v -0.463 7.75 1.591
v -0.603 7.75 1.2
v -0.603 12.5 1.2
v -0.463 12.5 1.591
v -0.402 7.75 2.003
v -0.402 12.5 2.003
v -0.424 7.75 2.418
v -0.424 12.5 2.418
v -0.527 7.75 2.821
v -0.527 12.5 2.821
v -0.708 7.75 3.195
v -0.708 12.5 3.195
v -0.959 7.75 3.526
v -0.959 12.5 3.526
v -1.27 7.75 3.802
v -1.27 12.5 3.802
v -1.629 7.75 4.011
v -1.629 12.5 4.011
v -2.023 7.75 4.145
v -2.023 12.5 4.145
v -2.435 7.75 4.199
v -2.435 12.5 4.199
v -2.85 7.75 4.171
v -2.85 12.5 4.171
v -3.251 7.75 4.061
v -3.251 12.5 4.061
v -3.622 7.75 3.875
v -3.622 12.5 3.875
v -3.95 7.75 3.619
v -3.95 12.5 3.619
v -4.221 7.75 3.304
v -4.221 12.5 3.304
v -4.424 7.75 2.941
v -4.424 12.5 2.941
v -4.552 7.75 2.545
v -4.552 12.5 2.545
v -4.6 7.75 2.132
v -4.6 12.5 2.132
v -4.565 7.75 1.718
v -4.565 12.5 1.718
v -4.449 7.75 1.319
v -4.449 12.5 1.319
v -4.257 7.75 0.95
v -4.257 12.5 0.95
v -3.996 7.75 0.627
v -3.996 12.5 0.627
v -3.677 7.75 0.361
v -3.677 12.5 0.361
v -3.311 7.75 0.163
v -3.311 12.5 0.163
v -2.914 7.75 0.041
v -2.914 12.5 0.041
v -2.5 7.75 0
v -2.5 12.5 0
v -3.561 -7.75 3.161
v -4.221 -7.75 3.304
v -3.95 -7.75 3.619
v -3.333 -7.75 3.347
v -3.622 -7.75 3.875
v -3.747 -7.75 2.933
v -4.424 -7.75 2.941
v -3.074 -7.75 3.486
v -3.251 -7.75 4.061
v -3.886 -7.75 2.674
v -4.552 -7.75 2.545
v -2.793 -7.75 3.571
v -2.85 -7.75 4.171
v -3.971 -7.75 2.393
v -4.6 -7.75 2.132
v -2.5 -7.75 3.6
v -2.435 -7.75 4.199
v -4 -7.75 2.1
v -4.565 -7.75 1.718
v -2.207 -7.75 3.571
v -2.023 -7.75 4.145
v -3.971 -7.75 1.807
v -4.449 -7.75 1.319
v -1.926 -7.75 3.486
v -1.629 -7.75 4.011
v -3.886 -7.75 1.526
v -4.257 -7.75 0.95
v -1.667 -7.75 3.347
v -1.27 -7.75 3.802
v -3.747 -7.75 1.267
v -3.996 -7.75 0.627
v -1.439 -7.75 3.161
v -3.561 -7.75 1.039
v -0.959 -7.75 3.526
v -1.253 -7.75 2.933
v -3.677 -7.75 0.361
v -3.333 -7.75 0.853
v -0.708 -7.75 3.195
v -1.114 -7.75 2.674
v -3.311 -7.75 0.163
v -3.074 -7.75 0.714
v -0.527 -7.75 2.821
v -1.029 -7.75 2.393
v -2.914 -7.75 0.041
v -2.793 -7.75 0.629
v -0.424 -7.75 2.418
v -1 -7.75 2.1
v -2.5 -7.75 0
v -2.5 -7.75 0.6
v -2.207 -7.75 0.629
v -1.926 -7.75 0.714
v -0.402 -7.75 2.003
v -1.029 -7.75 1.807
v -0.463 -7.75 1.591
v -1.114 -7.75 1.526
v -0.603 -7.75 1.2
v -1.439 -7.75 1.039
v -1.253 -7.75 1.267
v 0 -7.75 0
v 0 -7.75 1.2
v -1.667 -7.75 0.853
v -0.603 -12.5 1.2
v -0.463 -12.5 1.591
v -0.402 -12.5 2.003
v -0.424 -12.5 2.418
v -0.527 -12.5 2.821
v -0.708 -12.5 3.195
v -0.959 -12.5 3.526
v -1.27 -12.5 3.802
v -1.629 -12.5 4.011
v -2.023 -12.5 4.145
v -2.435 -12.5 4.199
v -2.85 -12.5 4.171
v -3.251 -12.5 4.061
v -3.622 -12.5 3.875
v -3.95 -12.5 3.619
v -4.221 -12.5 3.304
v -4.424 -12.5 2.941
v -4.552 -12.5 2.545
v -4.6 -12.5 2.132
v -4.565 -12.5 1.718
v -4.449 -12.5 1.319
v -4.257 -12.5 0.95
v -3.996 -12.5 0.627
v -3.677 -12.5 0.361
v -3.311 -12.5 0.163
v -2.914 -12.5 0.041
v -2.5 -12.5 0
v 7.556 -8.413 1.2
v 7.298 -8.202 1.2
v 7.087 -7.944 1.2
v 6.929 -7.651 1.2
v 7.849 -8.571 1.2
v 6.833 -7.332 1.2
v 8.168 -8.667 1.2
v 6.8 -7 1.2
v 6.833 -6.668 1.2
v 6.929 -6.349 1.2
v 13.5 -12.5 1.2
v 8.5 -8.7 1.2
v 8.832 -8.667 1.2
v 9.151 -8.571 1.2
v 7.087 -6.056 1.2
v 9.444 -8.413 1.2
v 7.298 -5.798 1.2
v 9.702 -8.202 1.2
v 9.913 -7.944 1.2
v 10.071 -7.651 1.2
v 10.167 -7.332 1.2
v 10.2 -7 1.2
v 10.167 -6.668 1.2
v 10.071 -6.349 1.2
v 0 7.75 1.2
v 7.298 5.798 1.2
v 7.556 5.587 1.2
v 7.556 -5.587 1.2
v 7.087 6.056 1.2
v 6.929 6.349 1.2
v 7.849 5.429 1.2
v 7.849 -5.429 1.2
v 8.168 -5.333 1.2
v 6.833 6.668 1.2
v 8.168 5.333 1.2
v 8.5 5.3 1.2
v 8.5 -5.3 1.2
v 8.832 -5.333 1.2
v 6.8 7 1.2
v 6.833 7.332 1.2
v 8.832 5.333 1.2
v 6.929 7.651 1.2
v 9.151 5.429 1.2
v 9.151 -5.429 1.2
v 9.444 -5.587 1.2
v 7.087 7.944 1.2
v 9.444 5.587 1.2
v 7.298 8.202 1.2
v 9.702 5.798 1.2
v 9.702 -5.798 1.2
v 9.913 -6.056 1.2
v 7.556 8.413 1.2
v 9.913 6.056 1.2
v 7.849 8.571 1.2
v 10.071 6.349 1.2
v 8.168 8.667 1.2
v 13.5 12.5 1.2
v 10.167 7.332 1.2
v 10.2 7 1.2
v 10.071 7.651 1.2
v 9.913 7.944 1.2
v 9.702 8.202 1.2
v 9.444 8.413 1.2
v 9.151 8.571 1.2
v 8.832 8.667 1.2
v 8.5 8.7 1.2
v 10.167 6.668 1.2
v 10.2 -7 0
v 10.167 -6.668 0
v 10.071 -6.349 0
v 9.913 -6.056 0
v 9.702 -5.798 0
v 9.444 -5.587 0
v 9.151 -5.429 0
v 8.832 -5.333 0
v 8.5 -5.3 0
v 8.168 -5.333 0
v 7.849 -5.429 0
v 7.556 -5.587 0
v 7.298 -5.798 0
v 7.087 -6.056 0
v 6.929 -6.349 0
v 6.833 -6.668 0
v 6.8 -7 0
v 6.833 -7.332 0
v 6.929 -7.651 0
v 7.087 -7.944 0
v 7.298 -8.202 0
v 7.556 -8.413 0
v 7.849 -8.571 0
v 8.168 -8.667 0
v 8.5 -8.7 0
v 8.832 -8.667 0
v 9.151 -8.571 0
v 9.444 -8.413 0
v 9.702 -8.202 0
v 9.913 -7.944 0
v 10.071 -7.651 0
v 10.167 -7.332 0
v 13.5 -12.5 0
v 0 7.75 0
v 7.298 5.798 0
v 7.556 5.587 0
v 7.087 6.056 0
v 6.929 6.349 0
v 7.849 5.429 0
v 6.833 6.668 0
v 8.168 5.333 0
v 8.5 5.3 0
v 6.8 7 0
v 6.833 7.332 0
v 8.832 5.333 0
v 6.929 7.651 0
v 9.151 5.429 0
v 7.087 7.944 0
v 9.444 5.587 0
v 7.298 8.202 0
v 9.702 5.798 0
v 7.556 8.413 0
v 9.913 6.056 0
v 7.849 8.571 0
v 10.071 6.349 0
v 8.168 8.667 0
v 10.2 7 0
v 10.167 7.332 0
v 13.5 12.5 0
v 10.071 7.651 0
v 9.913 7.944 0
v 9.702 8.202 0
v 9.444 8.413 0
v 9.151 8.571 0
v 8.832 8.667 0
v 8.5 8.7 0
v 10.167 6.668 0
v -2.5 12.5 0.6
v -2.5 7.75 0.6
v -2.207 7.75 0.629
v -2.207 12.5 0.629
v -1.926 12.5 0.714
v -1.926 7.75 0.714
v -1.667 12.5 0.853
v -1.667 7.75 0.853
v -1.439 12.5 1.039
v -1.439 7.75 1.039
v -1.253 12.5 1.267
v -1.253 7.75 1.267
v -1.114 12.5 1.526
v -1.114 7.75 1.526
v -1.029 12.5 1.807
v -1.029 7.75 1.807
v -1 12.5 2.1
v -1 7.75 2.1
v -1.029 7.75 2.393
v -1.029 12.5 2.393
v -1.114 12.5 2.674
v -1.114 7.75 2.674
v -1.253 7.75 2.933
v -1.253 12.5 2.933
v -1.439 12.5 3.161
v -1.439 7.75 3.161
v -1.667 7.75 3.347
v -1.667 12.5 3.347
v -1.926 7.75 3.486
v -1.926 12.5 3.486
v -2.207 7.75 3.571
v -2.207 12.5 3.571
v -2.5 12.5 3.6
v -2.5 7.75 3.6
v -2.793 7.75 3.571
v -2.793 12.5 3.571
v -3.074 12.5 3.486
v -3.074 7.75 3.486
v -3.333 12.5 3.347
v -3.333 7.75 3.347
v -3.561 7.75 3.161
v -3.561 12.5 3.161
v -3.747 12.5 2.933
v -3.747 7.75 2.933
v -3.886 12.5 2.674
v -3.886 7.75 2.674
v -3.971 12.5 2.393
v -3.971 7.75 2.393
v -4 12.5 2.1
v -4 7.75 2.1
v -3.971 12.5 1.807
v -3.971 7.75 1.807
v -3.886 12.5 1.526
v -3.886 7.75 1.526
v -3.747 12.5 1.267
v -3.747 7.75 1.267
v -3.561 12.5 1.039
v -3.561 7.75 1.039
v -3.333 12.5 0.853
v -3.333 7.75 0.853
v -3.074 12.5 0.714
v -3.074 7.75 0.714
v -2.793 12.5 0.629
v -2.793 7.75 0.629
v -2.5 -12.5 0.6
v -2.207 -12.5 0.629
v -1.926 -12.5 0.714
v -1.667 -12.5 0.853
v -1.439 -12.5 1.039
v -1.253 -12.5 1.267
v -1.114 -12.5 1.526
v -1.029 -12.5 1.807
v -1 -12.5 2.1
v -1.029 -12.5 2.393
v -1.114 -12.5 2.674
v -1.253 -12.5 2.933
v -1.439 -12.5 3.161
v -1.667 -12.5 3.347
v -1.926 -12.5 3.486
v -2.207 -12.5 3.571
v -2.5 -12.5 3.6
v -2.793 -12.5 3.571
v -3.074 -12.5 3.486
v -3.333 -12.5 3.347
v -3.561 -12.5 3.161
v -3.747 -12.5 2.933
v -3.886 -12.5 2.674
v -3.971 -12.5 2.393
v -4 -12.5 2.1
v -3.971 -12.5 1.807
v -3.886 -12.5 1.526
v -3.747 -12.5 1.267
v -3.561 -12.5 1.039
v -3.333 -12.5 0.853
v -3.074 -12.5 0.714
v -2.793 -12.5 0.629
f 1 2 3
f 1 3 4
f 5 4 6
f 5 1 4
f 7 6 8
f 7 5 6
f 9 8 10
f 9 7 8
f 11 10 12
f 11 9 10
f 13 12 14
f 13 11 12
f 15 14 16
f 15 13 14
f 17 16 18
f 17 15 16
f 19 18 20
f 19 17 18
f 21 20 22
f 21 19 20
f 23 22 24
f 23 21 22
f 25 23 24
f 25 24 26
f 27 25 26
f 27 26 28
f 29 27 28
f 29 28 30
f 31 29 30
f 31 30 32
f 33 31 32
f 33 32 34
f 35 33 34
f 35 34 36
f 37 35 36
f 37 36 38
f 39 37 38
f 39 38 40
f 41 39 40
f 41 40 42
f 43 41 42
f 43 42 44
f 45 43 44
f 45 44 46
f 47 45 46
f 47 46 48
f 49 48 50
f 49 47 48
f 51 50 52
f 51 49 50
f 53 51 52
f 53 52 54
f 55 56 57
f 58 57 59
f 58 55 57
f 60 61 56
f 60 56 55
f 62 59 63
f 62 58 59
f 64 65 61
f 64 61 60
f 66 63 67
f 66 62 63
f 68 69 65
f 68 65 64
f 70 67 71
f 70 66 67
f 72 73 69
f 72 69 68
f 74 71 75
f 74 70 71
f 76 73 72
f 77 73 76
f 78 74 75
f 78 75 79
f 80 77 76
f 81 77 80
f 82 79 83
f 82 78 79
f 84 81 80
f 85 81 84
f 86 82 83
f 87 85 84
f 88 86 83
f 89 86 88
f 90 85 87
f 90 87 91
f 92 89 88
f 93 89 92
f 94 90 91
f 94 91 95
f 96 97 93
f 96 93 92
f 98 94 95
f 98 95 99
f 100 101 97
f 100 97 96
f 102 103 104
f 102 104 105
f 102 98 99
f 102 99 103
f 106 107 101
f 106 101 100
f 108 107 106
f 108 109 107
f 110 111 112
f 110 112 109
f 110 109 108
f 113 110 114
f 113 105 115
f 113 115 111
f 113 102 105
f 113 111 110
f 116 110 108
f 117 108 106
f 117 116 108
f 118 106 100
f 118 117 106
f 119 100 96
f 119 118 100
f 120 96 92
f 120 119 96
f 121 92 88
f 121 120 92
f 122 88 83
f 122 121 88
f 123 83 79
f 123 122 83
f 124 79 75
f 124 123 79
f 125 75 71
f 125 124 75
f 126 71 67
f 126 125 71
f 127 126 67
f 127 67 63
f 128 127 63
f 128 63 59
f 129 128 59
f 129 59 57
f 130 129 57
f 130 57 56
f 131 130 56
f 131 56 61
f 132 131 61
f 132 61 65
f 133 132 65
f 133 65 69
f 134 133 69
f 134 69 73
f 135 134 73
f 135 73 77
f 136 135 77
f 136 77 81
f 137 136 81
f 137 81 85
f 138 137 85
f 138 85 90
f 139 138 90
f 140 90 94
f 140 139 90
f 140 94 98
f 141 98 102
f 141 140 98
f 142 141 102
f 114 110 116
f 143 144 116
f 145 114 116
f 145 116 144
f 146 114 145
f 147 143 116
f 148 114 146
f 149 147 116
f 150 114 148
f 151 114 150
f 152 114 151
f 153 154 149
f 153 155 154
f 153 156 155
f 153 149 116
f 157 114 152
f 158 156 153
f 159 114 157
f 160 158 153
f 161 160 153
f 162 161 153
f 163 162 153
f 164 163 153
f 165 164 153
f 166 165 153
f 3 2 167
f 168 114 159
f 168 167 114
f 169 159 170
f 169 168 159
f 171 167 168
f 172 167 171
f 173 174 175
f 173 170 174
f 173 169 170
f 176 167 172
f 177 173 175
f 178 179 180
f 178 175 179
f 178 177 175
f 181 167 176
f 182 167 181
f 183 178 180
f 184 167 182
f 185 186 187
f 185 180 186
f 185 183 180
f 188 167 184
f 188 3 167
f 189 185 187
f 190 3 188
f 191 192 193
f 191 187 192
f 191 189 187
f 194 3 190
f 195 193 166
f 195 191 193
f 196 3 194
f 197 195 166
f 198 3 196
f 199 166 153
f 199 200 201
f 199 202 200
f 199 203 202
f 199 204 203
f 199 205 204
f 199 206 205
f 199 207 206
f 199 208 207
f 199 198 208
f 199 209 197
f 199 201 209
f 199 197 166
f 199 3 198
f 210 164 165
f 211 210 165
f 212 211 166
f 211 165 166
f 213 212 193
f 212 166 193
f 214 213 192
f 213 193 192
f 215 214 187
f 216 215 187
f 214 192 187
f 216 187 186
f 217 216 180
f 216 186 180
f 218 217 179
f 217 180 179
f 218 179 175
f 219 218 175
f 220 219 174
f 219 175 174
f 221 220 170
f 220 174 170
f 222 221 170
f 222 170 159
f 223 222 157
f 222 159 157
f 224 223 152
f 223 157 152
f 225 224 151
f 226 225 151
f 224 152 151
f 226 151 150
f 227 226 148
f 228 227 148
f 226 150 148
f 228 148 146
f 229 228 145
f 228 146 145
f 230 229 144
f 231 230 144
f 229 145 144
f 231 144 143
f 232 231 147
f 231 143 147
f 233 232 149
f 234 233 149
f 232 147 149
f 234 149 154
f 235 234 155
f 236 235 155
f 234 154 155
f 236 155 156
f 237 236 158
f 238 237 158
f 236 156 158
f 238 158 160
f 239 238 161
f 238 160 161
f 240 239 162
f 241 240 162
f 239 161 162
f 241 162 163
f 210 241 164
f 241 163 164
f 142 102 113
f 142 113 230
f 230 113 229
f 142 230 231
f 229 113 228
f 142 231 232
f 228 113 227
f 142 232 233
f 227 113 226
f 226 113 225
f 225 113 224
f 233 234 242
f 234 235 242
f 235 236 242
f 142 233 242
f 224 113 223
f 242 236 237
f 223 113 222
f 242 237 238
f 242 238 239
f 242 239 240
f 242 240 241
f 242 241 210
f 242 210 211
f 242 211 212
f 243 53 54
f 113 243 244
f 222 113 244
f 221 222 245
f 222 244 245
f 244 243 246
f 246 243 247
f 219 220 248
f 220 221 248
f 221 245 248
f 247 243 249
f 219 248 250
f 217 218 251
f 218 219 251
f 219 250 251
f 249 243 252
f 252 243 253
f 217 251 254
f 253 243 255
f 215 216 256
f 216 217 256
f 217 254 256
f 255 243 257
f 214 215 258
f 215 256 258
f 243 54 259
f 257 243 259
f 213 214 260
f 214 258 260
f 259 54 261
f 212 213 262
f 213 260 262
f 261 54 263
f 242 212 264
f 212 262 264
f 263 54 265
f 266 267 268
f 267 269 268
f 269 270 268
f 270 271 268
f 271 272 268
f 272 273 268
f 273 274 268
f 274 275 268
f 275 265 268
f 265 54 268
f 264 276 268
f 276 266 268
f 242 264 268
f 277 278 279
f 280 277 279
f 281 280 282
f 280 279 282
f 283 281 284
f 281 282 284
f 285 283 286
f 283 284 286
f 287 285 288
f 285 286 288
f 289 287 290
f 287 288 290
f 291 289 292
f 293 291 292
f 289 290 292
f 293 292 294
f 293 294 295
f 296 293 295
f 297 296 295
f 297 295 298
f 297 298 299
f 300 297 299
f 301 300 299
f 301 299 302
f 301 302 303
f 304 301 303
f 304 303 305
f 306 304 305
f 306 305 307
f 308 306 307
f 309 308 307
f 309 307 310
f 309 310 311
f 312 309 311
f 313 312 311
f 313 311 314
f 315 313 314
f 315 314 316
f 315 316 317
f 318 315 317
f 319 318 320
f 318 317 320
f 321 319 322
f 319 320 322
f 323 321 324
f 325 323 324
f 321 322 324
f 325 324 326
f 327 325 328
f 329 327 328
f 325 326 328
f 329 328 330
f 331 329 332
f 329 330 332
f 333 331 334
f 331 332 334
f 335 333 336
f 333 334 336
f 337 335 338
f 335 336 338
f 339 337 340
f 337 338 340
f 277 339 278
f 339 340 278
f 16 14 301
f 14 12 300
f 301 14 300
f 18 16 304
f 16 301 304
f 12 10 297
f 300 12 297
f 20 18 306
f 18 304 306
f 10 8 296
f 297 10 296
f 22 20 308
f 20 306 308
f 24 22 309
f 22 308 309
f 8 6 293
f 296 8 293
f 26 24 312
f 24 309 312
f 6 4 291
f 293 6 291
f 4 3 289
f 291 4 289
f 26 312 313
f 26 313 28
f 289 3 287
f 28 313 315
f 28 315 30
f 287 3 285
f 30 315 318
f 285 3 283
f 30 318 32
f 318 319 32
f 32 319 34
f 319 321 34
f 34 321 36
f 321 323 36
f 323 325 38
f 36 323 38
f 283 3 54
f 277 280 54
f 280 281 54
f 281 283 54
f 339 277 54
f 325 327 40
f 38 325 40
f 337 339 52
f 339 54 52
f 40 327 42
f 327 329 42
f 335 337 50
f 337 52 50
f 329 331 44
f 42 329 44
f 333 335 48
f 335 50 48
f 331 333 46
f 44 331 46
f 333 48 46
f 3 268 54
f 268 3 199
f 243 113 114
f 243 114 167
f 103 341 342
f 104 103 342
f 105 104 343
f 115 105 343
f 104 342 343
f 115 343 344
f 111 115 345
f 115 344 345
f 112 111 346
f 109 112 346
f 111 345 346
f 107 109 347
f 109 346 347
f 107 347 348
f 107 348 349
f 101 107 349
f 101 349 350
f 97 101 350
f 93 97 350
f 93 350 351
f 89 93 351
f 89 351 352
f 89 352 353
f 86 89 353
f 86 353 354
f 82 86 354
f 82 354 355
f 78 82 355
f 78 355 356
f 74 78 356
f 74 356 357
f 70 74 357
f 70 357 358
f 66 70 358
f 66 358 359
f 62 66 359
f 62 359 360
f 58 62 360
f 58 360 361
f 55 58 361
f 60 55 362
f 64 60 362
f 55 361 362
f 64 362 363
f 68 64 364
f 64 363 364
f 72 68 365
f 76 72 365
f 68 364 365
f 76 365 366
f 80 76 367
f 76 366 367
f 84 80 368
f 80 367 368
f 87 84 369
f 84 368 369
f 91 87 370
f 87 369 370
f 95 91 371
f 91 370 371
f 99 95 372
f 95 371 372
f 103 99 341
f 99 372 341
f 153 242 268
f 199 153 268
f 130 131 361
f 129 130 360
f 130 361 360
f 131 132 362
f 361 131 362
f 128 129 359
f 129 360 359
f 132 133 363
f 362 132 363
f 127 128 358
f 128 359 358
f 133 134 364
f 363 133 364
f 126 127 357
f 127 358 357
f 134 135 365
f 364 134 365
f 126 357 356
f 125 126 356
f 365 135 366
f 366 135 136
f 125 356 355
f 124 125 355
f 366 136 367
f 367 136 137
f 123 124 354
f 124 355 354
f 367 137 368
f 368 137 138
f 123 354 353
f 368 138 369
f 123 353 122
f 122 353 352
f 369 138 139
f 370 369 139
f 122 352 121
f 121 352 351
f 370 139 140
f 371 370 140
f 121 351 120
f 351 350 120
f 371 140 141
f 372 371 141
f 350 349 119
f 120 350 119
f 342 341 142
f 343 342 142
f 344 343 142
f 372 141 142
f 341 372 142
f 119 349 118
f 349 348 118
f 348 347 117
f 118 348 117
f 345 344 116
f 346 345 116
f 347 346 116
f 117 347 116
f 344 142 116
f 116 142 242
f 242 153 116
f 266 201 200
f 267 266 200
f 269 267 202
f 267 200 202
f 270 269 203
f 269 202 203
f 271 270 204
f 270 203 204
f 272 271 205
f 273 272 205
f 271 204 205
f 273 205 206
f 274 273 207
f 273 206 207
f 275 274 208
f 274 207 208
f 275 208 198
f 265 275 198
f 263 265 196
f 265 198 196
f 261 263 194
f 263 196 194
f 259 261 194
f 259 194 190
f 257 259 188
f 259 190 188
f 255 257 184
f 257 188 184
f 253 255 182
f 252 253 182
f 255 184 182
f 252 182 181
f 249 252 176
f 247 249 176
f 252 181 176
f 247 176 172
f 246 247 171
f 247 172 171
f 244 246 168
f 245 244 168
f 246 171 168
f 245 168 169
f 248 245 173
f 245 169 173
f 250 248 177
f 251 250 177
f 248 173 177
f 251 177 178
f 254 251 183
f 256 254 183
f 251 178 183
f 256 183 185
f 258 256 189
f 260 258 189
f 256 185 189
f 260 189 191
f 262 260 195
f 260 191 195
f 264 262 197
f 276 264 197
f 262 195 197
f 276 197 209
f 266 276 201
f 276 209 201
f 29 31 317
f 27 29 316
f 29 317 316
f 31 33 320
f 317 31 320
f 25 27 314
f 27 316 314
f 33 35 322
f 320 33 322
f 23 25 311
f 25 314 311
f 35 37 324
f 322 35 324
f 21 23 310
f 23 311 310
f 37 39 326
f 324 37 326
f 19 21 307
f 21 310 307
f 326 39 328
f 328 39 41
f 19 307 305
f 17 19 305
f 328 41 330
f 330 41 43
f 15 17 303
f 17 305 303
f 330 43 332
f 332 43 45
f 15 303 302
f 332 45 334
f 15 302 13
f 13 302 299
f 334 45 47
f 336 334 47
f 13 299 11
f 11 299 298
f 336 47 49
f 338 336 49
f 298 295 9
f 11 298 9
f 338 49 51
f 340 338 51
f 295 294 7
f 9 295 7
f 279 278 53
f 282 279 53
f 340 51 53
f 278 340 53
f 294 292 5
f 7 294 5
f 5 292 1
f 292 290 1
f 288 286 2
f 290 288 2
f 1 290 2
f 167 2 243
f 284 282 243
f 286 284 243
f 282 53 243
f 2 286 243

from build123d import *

# Parameters (mm, degrees)
SKETCH_1_W          = 13.5
SKETCH_1_H          = 25
SKETCH_1_W_2        = 2.5
SKETCH_1_H_2        = 4.75
EXTRUDE_1_DEPTH     = 1.2
SKETCH_2_R          = 1.7
CUT_EXTRUDE_1_DEPTH = 1.2
SKETCH_3_R          = 2.1
EXTRUDE_2_DEPTH     = 25
SKETCH_4_R          = 1.5
CUT_EXTRUDE_2_DEPTH = 25
SKETCH_5_W          = 5
SKETCH_5_H          = 15.5
CUT_EXTRUDE_3_DEPTH = 7.5


with BuildPart() as part:
    # 草图1 → 凸台-拉伸1 (new body)
    with BuildSketch(Plane.XY):
        with Locations((6.75, 0)):
            Rectangle(SKETCH_1_W, SKETCH_1_H)
        with Locations((-1.25, 10.125)):
            Rectangle(SKETCH_1_W_2, SKETCH_1_H_2)
        with Locations((-1.25, -10.125)):
            Rectangle(SKETCH_1_W_2, SKETCH_1_H_2)
    extrude(amount=EXTRUDE_1_DEPTH)

    # 草图2 → 切除-拉伸1 (cut)
    with BuildSketch(Plane.XY.offset(1.2)):
        with Locations((8.5, 7)):
            Circle(SKETCH_2_R)
        with Locations((8.5, -7)):
            Circle(SKETCH_2_R)
    extrude(amount=-CUT_EXTRUDE_1_DEPTH, mode=Mode.SUBTRACT)

    # 草图3 → 凸台-拉伸2 (add)
    with BuildSketch(Plane.XZ.offset(12.5)):
        with Locations(Location((-2.5, 2.1, 0), (0, 0, 270))):
            Circle(SKETCH_3_R)
    extrude(amount=-EXTRUDE_2_DEPTH)

    # 草图4 → 切除-拉伸2 (cut)
    with BuildSketch(Plane.XZ.offset(12.5)):
        with Locations(Location((-2.5, 2.1, 0), (0, 0, 270))):
            Circle(SKETCH_4_R)
    extrude(amount=-CUT_EXTRUDE_2_DEPTH, mode=Mode.SUBTRACT)

    # 草图5 → 切除-拉伸3 (cut, symmetric)
    with BuildSketch(Plane.XY.offset(1.2)):
        with Locations((-2.5, 0)):
            Rectangle(SKETCH_5_W, SKETCH_5_H)
    extrude(amount=CUT_EXTRUDE_3_DEPTH, both=True, mode=Mode.SUBTRACT)


solid = part.part
